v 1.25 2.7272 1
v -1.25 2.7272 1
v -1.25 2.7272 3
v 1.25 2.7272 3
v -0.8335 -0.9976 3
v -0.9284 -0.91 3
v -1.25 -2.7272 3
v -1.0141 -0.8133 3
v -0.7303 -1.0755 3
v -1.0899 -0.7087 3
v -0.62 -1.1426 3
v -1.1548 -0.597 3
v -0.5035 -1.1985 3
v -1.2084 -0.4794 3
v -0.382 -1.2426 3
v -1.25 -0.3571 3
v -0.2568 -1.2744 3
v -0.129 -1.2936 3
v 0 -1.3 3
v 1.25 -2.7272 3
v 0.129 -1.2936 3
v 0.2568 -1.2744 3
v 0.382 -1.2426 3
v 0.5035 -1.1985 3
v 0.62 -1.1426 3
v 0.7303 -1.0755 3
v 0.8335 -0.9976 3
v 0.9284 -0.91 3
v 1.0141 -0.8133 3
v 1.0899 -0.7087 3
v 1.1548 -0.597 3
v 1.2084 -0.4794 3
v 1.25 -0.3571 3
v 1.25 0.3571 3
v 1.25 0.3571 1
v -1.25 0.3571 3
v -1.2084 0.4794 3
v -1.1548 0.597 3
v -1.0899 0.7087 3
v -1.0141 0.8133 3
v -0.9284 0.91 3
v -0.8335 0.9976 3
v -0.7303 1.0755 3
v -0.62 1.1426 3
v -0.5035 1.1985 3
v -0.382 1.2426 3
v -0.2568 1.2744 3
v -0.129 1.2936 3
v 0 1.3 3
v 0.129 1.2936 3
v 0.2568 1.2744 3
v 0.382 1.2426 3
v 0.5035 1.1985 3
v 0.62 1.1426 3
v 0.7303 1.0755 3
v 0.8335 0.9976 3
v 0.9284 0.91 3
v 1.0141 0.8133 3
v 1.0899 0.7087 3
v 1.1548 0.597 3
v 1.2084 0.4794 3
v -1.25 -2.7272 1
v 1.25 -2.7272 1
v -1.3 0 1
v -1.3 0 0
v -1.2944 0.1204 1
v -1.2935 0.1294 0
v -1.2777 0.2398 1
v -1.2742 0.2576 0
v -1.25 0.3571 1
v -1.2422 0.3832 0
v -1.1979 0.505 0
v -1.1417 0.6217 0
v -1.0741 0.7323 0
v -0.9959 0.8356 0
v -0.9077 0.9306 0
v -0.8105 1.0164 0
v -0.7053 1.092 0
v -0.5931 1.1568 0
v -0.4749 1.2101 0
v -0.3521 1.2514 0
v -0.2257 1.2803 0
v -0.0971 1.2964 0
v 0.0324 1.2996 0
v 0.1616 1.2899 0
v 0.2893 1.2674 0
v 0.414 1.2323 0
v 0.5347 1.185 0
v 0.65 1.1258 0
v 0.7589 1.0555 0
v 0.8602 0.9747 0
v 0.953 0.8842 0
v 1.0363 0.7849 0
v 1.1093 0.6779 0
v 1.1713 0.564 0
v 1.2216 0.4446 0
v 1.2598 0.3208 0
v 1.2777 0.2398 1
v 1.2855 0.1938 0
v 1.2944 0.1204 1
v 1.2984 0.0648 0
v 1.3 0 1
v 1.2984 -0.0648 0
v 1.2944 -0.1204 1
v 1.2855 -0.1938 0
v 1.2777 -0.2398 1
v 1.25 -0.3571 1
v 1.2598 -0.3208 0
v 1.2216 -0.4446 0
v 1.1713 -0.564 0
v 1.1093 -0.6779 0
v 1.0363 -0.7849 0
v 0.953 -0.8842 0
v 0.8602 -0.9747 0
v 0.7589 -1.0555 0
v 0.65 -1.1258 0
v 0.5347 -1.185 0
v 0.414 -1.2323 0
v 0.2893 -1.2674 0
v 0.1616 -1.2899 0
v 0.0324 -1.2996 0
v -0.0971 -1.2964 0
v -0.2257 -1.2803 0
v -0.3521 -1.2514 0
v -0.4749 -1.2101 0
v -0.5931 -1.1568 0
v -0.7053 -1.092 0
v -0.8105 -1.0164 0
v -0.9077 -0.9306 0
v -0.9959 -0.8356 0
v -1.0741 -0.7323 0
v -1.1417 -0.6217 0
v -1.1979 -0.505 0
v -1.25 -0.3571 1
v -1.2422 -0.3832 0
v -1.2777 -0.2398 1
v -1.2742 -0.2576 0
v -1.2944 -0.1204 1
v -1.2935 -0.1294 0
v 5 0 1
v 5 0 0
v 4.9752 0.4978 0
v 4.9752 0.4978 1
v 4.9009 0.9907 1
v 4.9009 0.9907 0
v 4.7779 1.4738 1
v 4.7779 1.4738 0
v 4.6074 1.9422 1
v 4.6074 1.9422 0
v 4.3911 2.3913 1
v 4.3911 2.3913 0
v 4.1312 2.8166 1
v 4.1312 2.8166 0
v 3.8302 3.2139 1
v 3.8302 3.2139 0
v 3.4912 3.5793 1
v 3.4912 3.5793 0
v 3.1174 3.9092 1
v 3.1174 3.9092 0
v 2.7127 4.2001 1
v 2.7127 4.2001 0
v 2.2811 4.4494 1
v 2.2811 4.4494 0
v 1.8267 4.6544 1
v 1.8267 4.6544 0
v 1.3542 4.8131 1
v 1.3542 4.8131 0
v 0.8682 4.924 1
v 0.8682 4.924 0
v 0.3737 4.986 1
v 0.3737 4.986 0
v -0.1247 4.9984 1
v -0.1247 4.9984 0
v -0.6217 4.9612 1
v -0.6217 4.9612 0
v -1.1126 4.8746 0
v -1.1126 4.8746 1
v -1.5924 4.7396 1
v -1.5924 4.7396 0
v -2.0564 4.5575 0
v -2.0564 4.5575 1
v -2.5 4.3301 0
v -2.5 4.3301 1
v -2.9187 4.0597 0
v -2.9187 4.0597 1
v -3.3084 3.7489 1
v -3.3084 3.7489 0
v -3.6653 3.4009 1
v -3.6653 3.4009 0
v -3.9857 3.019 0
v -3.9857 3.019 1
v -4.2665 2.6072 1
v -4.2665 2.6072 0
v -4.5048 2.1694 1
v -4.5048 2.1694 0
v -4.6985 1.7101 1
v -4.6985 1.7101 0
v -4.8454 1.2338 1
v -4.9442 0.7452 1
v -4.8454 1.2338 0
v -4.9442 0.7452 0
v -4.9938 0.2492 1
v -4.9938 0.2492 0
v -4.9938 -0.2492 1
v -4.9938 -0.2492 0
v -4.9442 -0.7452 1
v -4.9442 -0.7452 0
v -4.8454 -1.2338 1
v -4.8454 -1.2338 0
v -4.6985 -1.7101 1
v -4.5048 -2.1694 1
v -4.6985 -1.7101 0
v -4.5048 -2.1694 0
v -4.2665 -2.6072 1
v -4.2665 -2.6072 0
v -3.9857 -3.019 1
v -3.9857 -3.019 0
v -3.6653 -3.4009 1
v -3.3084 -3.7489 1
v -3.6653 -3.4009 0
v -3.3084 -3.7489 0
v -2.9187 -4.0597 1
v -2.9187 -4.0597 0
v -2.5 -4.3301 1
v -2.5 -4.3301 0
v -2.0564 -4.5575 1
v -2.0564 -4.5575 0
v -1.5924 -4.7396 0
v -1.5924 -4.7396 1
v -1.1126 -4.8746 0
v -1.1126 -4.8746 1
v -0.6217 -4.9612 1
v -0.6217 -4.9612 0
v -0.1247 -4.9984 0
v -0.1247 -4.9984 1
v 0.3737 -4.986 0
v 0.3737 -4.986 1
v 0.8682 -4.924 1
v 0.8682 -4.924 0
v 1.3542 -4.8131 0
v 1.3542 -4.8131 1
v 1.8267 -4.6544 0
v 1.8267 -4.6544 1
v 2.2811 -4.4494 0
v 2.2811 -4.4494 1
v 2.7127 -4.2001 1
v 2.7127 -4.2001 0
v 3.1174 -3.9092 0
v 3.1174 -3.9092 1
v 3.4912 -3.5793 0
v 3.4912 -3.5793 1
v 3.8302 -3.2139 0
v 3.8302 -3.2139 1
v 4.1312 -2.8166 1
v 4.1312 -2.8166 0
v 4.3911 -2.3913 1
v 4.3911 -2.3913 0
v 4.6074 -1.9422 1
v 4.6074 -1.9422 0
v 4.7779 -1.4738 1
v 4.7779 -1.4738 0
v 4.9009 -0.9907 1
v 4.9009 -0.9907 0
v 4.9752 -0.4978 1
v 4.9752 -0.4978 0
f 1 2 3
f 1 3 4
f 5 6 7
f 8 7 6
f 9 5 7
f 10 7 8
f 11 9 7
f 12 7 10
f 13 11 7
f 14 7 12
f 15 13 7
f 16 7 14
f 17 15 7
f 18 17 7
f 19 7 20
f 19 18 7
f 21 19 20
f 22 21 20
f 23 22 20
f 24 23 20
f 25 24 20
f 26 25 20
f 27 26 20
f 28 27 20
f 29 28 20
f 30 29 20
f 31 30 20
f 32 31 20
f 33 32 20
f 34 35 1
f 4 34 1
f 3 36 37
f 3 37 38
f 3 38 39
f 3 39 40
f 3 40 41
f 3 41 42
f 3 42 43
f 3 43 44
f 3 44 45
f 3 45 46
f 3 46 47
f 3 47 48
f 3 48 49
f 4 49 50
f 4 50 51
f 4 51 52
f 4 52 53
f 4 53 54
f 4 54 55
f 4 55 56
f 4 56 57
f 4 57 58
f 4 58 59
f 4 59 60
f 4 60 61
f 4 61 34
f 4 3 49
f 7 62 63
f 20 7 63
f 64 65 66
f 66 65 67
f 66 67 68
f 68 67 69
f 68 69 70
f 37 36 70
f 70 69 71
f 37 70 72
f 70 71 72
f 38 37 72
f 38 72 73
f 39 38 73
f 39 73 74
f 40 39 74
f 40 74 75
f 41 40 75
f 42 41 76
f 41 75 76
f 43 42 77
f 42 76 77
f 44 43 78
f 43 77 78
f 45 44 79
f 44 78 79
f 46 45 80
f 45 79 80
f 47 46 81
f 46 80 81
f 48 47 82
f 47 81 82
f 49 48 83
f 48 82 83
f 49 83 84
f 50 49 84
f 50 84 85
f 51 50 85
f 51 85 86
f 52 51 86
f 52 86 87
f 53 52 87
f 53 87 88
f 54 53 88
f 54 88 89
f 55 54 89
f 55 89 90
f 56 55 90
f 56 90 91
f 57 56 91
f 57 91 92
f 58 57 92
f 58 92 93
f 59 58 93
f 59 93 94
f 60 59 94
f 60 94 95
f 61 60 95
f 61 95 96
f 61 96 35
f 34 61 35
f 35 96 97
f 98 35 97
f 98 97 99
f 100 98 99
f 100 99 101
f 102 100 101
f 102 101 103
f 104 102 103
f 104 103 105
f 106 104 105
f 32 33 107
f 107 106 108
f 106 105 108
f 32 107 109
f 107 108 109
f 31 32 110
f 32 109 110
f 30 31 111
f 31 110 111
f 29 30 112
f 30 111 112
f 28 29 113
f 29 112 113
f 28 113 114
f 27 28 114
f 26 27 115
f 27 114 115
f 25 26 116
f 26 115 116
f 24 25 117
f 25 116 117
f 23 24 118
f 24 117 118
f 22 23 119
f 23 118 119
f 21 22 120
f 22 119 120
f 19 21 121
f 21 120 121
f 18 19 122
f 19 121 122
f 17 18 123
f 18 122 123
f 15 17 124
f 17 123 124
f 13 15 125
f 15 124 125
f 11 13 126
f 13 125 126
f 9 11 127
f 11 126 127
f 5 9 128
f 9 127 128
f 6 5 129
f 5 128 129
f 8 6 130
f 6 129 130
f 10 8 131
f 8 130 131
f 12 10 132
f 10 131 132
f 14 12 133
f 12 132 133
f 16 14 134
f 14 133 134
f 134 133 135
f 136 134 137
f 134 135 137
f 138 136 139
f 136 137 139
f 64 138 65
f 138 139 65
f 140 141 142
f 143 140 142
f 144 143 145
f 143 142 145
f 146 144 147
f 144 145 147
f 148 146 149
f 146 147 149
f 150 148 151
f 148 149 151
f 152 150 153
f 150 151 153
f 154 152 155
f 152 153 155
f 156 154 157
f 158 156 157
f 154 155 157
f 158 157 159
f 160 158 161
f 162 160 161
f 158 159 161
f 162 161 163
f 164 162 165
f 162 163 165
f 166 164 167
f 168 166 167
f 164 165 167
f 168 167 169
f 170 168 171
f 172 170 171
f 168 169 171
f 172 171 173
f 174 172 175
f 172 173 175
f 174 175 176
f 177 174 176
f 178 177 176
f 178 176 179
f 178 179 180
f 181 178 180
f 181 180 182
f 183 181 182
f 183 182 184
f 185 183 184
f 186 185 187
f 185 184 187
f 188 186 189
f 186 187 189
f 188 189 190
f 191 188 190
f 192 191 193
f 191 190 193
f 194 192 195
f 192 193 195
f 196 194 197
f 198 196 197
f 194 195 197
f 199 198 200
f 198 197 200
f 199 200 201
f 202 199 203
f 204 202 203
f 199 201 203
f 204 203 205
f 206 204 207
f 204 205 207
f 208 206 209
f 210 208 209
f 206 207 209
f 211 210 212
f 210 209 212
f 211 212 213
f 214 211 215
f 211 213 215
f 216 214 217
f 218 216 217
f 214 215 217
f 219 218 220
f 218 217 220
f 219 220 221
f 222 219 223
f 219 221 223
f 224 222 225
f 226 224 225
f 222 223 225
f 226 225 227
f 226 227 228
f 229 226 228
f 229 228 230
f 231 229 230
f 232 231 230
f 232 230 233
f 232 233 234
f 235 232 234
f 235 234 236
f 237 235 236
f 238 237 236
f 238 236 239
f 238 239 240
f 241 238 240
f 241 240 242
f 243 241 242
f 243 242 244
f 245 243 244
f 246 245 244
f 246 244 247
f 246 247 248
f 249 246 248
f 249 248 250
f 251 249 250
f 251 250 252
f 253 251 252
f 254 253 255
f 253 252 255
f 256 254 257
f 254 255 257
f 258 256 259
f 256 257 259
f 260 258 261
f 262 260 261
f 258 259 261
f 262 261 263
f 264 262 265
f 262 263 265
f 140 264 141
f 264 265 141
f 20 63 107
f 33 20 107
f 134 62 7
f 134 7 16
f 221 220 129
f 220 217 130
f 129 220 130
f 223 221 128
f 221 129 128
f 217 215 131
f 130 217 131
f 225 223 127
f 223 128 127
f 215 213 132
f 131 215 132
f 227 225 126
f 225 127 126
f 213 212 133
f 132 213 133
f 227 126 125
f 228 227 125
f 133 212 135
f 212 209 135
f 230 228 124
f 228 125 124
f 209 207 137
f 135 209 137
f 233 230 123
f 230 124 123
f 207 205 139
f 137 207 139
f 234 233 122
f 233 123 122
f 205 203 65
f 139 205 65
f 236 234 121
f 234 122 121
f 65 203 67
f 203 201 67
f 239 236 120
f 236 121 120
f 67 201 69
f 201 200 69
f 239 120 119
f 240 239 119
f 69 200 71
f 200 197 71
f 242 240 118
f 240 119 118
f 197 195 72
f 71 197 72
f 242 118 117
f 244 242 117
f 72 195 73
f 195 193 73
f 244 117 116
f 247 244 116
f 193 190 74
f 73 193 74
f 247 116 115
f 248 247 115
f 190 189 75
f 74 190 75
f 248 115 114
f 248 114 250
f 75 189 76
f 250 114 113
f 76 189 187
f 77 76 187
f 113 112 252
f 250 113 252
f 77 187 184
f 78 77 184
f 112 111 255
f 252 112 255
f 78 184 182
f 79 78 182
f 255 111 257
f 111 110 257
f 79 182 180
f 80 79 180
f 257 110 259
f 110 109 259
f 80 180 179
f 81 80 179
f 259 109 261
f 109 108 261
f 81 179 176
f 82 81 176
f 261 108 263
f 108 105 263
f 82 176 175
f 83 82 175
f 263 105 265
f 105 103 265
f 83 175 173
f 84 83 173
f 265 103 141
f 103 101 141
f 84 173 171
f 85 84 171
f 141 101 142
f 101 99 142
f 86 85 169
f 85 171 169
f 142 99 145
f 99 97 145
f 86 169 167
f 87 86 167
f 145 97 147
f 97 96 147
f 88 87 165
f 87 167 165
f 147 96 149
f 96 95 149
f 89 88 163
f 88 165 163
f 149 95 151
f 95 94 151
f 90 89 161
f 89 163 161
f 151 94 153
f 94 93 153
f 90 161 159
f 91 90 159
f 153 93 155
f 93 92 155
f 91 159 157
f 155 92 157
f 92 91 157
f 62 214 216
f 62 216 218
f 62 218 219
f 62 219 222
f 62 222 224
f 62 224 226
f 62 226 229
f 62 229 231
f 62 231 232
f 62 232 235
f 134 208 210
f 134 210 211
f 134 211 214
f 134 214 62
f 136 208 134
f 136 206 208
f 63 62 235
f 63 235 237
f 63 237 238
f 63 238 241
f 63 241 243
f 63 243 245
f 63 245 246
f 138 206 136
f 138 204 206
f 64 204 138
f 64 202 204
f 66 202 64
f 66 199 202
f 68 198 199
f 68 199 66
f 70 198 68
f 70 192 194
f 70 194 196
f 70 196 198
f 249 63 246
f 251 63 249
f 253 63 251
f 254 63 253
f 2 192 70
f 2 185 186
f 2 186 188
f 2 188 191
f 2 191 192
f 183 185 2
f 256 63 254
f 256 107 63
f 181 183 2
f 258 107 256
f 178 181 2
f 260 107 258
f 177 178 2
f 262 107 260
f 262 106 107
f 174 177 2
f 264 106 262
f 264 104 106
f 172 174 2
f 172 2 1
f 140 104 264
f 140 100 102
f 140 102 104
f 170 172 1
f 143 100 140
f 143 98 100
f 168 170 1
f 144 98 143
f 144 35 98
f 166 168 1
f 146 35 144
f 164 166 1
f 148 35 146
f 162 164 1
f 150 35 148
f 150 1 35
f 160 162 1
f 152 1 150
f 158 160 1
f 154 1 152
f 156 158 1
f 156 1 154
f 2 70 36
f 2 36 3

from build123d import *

# Parameters (mm, degrees)
SKETCH1_R                      = 5
BOSS_EXTRUDE1_DEPTH            = 1
SKETCH2_W                      = 2.5
SKETCH2_H                      = 5.454356058
BOSS_EXTRUDE2_DEPTH            = 2
F_2_6_2_6_DIAMETER_HOLE1_D     = 2.6
F_2_6_2_6_DIAMETER_HOLE1_DEPTH = 9
F_2_6_2_6_DIAMETER_HOLE1_TIP   = 0.781118805


with BuildPart() as part:
    # Sketch1 → Boss-Extrude1 (new body)
    with BuildSketch(Plane.XY):
        Circle(SKETCH1_R)
    extrude(amount=BOSS_EXTRUDE1_DEPTH)

    # Sketch2 → Boss-Extrude2 (add)
    with BuildSketch(Plane.XY.offset(1)):
        Rectangle(SKETCH2_W, SKETCH2_H)
    extrude(amount=BOSS_EXTRUDE2_DEPTH)

    # Ø2.6 (2.6) Diameter Hole1
    with Locations(Plane.XY.offset(3)):
        with Locations((0, 0)):
            Hole(F_2_6_2_6_DIAMETER_HOLE1_D / 2, depth=F_2_6_2_6_DIAMETER_HOLE1_DEPTH)
            with Locations((0, 0, -(F_2_6_2_6_DIAMETER_HOLE1_DEPTH + F_2_6_2_6_DIAMETER_HOLE1_TIP / 2))):  # 118° drill point
                Cone(0, F_2_6_2_6_DIAMETER_HOLE1_D / 2, F_2_6_2_6_DIAMETER_HOLE1_TIP, mode=Mode.SUBTRACT)


solid = part.part
